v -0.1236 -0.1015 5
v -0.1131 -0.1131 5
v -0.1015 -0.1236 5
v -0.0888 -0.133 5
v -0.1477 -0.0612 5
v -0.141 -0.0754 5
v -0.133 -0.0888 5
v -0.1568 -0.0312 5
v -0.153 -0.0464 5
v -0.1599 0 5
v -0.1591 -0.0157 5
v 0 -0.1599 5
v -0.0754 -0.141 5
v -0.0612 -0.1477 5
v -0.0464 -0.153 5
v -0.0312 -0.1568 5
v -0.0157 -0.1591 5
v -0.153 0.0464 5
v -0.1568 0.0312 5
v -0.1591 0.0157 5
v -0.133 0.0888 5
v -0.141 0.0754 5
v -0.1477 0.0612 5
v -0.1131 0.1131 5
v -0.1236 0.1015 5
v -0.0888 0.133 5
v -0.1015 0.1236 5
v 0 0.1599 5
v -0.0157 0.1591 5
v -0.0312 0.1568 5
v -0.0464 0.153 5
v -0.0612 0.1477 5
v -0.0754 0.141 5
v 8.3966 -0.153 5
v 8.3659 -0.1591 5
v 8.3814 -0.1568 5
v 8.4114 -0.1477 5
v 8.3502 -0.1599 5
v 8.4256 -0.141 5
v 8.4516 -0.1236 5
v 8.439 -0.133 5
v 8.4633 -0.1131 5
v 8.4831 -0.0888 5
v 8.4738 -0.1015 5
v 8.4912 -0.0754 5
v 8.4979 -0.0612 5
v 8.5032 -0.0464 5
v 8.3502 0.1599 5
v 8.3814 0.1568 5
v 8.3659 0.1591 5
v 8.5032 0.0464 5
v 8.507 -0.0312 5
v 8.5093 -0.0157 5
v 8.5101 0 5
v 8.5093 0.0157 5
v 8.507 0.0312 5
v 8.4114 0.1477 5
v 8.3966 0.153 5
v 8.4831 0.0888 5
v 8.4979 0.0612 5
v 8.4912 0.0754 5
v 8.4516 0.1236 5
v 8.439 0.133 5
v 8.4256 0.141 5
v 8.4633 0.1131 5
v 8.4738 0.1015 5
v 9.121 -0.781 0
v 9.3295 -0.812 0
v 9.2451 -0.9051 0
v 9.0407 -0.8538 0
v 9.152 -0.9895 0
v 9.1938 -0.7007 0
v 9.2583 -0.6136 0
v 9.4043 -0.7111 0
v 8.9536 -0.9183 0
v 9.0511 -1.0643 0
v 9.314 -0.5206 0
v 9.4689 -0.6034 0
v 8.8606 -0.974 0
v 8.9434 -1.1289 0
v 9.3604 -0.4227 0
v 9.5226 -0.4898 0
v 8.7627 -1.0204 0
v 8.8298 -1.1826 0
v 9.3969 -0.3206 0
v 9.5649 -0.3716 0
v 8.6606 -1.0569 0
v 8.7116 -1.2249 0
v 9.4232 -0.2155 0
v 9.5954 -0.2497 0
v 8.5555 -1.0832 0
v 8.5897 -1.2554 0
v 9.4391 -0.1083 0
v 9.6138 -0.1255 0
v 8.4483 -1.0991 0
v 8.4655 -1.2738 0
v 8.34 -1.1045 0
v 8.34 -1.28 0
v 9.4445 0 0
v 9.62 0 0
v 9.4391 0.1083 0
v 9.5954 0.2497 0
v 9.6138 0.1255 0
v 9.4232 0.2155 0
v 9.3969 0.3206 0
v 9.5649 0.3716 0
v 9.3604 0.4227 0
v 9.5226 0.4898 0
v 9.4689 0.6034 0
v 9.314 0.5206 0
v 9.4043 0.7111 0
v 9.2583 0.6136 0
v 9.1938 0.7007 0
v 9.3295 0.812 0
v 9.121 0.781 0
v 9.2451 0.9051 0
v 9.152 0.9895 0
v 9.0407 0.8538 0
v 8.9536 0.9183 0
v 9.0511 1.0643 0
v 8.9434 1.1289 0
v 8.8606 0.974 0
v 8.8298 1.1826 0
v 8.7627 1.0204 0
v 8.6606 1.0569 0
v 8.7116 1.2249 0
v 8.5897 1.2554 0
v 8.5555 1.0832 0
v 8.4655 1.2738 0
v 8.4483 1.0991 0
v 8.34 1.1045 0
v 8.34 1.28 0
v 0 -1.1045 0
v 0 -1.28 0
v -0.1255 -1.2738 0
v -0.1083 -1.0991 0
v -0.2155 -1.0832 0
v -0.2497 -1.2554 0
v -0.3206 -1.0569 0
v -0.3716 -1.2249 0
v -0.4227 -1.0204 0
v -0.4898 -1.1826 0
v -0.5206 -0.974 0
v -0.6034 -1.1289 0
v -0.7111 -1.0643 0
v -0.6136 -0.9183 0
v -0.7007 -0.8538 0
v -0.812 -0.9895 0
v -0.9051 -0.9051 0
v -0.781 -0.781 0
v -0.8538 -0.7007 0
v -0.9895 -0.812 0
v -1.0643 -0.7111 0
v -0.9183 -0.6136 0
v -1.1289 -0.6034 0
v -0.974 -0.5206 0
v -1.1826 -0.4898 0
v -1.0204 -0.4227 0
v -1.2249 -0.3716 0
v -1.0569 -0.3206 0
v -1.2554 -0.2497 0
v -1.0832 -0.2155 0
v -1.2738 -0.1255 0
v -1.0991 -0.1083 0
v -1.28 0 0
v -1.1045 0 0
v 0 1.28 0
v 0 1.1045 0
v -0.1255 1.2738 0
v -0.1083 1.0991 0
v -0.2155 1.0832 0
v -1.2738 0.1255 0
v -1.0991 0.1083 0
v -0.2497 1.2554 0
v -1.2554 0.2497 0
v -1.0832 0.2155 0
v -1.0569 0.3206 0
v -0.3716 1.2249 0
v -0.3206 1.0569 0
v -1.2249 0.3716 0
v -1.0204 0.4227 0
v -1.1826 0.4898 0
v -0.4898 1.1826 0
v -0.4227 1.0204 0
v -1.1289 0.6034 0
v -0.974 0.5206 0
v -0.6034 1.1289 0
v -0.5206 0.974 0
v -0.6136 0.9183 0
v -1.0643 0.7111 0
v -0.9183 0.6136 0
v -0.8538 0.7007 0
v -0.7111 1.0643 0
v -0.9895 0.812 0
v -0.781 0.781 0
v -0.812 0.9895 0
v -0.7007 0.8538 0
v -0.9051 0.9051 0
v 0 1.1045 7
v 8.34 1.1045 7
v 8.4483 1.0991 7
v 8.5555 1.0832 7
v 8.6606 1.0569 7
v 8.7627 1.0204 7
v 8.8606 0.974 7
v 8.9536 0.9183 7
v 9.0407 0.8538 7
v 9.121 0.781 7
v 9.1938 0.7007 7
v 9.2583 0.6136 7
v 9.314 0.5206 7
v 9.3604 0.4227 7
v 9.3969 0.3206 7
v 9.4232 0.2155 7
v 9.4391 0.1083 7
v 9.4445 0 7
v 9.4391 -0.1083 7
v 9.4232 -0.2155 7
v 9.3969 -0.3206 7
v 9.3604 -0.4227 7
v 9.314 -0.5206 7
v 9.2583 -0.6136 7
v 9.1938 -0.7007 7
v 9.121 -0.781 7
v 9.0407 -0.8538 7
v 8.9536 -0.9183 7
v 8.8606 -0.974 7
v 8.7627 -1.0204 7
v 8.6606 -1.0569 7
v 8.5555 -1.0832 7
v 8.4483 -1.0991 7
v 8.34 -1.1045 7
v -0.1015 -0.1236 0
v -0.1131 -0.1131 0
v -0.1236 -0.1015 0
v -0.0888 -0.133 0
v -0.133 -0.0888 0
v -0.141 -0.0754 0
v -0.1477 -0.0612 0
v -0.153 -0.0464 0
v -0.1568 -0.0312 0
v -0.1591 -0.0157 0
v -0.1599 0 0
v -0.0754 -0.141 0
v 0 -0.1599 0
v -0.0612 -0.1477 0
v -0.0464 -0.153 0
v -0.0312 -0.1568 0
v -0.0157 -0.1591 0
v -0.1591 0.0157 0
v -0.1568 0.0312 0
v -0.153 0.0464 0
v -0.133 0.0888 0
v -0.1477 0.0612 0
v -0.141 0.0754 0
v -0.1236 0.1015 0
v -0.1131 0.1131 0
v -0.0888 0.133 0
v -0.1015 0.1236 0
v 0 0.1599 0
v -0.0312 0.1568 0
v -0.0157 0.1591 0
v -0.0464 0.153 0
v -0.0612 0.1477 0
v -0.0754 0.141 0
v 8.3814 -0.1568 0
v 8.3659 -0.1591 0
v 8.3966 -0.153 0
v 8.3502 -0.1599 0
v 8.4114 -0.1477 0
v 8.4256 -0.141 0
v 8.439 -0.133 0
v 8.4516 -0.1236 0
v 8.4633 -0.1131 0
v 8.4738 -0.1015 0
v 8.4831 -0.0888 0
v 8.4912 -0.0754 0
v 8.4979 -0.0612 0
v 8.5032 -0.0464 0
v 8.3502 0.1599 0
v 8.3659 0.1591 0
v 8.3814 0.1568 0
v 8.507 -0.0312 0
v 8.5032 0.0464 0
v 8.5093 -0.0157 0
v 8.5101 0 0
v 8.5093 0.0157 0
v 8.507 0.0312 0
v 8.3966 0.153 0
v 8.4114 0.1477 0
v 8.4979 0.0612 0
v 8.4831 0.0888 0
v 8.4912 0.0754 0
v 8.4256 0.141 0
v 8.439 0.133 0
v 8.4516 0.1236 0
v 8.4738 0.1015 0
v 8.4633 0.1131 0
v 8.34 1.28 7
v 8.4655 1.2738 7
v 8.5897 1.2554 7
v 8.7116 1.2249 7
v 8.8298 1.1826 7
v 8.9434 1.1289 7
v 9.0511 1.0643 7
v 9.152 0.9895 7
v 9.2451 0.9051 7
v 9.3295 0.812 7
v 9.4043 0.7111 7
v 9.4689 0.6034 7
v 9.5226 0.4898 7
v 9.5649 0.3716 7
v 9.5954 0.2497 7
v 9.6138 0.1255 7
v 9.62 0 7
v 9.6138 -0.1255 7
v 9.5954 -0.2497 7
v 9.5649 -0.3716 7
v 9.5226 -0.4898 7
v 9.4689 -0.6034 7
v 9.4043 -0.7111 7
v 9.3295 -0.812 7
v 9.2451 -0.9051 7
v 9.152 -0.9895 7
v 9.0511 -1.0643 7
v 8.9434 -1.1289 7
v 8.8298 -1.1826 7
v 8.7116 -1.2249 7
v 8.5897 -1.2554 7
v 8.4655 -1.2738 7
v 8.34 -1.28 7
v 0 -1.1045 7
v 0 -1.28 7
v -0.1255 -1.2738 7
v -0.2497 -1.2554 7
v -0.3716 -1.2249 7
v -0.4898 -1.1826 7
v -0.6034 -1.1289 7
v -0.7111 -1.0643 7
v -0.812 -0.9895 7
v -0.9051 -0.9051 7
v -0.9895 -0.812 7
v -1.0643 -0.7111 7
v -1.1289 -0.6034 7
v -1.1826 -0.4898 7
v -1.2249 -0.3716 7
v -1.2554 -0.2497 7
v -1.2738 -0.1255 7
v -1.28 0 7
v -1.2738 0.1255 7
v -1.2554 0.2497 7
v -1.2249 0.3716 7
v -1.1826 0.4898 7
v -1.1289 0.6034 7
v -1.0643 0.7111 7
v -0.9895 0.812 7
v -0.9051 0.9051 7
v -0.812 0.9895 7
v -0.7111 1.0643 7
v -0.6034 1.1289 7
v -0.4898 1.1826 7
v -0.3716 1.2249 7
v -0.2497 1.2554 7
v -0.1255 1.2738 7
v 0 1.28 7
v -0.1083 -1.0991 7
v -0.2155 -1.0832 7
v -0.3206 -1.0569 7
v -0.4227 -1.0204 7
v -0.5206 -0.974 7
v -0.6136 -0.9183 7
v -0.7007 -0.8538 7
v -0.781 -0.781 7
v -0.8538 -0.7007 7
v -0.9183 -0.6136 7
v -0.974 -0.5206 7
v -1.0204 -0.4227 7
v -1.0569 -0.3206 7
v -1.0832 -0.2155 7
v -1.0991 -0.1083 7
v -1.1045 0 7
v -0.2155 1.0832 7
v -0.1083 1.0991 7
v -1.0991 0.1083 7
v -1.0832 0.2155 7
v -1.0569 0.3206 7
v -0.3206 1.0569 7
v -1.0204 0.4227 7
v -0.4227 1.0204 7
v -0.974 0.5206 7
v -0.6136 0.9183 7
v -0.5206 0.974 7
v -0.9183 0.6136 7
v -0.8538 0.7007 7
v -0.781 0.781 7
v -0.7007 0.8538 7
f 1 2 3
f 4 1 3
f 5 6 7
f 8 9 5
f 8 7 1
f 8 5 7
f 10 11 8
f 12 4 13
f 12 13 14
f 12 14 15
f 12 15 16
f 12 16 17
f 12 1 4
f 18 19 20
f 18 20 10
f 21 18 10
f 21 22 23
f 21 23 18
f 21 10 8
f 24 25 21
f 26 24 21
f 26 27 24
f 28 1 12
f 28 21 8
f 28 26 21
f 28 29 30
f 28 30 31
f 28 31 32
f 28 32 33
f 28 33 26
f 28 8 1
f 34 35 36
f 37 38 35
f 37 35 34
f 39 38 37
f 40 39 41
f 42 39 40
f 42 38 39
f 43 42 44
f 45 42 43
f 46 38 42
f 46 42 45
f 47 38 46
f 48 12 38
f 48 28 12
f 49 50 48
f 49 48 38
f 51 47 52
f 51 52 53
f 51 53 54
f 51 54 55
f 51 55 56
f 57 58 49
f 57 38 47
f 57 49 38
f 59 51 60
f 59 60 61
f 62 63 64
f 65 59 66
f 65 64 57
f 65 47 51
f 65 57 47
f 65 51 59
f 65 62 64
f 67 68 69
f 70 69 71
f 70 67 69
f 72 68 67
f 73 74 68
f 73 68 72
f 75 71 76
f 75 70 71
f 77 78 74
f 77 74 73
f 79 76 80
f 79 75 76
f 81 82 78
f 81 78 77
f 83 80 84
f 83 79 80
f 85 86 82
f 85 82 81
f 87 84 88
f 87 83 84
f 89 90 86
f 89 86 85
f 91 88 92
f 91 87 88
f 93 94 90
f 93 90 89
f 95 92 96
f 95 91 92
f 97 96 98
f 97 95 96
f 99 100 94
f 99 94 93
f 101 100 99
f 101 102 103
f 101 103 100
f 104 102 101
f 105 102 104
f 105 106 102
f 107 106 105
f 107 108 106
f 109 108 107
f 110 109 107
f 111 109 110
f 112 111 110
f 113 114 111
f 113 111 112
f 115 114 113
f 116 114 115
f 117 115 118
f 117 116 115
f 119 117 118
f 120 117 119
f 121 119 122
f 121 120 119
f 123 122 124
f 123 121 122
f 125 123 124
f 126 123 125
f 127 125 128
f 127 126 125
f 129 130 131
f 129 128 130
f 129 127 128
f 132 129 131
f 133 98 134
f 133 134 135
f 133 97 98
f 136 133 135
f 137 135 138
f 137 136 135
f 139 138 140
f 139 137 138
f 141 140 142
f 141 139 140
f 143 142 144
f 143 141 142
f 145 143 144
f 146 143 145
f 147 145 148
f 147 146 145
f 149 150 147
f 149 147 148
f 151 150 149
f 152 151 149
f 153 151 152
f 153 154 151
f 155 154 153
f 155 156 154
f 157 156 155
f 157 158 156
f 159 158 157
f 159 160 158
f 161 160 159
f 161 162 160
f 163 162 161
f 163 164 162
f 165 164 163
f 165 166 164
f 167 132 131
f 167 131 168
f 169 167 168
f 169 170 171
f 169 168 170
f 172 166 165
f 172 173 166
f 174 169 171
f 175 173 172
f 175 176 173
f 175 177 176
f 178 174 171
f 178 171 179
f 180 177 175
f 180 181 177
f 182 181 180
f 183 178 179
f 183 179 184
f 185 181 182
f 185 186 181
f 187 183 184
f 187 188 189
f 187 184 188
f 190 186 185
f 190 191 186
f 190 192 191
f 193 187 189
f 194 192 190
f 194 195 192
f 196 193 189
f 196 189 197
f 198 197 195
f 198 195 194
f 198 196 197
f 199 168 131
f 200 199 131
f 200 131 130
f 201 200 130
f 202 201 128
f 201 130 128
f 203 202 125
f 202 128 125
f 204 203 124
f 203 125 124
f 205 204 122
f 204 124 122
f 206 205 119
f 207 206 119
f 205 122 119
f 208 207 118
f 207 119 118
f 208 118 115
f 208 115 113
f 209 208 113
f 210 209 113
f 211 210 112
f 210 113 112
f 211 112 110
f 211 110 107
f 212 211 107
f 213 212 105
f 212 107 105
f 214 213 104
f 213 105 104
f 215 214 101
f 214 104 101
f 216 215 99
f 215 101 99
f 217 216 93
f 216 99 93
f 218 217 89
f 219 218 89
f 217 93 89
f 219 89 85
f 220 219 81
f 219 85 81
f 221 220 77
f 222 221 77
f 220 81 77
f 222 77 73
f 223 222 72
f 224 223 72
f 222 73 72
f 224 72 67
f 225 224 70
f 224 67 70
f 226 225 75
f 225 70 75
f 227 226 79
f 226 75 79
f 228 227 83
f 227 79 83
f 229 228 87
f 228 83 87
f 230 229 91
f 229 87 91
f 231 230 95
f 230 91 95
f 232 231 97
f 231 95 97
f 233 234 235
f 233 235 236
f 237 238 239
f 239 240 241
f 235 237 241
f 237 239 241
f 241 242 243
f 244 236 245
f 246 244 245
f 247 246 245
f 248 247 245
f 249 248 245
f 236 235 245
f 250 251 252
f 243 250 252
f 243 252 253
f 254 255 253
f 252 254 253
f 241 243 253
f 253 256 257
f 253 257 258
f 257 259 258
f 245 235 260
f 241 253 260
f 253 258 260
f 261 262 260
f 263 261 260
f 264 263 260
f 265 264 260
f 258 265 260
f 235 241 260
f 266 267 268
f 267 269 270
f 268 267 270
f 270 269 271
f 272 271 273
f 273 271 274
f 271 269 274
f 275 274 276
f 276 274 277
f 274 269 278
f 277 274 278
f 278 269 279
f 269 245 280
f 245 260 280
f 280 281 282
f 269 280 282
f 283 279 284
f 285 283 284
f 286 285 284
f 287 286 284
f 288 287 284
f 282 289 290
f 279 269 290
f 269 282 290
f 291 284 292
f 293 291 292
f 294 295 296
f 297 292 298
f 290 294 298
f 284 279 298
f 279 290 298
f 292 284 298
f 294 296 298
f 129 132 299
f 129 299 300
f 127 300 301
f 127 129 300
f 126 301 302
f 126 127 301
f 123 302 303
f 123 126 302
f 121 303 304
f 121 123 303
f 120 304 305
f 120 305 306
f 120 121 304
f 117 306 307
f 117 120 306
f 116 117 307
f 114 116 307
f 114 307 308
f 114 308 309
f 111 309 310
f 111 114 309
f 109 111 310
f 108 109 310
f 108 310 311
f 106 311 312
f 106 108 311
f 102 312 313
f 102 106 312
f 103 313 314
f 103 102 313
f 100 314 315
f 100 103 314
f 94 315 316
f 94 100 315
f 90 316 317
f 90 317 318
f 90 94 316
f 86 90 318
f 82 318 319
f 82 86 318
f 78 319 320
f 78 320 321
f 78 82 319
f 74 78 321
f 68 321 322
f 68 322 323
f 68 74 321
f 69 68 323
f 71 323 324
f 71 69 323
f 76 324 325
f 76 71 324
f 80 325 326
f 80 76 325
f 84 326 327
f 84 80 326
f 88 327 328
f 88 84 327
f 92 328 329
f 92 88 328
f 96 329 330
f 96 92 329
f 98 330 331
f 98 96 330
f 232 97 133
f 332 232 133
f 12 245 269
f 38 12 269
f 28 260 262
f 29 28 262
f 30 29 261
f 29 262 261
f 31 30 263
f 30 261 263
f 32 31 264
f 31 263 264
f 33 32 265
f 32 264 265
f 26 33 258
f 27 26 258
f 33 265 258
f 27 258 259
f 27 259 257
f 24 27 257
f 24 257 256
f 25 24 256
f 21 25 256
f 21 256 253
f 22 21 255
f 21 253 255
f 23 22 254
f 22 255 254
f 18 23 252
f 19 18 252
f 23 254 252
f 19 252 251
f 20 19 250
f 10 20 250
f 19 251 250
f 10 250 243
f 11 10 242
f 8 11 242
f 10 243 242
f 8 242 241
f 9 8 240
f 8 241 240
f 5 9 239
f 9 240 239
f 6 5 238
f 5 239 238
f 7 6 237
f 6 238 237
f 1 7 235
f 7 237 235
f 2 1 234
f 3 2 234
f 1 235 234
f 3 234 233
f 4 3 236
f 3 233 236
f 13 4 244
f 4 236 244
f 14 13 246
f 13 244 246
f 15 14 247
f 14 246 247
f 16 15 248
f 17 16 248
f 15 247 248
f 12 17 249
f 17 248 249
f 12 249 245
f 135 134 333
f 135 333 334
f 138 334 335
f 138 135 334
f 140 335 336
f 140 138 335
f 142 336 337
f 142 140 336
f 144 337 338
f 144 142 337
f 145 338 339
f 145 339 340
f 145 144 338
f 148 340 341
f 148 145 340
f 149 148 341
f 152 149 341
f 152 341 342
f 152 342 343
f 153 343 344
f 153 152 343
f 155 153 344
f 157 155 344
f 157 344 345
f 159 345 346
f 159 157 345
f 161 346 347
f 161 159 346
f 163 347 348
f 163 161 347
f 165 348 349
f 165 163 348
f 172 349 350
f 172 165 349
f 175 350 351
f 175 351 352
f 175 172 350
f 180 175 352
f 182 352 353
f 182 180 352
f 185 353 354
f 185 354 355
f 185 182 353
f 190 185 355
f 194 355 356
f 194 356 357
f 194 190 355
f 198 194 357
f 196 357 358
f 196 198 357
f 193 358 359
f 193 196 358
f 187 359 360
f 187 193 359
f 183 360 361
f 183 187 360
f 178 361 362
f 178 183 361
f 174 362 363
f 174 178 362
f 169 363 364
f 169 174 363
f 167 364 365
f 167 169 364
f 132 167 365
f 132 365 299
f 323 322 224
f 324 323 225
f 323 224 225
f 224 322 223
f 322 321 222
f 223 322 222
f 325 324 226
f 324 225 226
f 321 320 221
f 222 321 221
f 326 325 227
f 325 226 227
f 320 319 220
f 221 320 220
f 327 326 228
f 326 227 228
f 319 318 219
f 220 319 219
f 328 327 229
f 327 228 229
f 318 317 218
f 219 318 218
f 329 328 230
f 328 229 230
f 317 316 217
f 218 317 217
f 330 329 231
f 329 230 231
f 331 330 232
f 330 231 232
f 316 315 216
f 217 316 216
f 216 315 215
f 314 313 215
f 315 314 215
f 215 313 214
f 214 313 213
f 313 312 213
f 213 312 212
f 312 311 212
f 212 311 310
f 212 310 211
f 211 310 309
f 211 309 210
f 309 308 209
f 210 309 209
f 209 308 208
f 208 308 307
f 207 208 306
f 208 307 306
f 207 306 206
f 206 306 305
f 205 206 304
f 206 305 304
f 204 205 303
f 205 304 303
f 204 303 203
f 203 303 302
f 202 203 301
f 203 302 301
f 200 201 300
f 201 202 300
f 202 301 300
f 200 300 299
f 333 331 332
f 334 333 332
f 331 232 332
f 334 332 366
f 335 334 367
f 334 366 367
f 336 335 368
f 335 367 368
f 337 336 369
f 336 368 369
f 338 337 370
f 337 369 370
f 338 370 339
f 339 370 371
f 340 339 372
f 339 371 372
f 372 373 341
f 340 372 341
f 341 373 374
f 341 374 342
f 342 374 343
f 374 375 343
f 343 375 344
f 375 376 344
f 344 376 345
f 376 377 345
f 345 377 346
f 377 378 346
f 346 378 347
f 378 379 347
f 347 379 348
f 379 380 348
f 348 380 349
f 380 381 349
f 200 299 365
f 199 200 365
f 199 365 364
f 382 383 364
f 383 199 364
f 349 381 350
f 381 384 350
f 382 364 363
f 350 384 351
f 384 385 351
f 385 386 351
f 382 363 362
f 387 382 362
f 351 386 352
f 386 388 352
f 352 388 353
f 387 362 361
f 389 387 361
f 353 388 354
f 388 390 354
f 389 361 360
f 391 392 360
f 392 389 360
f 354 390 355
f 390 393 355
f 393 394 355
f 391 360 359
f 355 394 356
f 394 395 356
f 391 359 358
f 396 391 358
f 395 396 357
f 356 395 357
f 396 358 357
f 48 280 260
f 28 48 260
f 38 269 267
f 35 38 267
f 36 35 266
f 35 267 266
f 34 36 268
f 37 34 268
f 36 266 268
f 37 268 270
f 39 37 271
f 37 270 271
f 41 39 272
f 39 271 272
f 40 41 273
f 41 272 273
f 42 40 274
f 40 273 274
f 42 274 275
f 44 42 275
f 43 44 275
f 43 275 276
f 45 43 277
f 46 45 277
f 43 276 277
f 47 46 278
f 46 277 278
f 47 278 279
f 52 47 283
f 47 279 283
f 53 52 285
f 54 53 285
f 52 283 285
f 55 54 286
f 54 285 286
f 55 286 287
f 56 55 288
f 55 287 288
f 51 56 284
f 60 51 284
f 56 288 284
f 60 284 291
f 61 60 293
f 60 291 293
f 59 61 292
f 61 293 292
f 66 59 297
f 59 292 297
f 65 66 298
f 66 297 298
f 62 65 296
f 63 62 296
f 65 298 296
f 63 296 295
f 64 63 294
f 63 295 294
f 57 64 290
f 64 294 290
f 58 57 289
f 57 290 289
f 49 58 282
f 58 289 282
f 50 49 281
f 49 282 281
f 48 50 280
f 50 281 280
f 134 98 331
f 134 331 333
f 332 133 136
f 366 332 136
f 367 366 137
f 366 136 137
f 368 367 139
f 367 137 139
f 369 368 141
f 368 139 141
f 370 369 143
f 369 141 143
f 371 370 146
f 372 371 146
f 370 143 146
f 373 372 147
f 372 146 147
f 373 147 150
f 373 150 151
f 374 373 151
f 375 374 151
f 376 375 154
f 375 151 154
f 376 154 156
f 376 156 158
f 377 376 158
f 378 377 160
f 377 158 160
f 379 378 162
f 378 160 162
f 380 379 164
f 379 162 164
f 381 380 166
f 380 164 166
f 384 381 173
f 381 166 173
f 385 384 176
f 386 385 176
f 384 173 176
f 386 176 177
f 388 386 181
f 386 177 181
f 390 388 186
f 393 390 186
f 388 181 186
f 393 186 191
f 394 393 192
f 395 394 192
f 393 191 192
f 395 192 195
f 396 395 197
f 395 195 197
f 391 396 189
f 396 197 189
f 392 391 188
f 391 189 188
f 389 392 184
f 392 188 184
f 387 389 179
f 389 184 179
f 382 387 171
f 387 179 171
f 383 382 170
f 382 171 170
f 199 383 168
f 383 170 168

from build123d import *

# Parameters (mm, degrees)
BOSS_EXTRUDE1_DEPTH = 7
BOSS_EXTRUDE3_DEPTH = 5


with BuildPart() as part:
    # Sketch1 → Boss-Extrude1 (new body)
    with BuildSketch(Plane.XY):
        with BuildLine():
            Line((0, 1.28), (8.34, 1.28))
            ThreePointArc((8.34, 1.28), (9.62, 0), (8.34, -1.28))
            Line((8.34, -1.28), (0, -1.28))
            ThreePointArc((0, -1.28), (-1.28, 0), (0, 1.28))
        make_face()
        with BuildLine():
            Line((0, 1.1044516), (8.34, 1.1044516))
            ThreePointArc((8.34, 1.1044516), (9.4444516, 0), (8.34, -1.1044516))
            Line((8.34, -1.1044516), (0, -1.1044516))
            ThreePointArc((0, -1.1044516), (-1.1044516, 0), (0, 1.1044516))
        make_face(mode=Mode.SUBTRACT)
    extrude(amount=BOSS_EXTRUDE1_DEPTH)


with BuildPart() as body_2:
    # Sketch2 → Boss-Extrude3 (new body)
    with BuildSketch(Plane(origin=(0, 0, 0), x_dir=(-1, 0, 0), z_dir=(0, 0, -1))):
        with BuildLine():
            Line((0, -0.159919522), (-8.350175881, -0.159919522))
            ThreePointArc((-8.350175881, -0.159919522), (-8.510095402, 0), (-8.350175881, 0.159919522))
            Line((-8.350175881, 0.159919522), (0, 0.159919522))
            ThreePointArc((0, 0.159919522), (0.159919522, 0), (0, -0.159919522))
        make_face()
    extrude(amount=-BOSS_EXTRUDE3_DEPTH)


solid = Compound([part.part, body_2.part])
